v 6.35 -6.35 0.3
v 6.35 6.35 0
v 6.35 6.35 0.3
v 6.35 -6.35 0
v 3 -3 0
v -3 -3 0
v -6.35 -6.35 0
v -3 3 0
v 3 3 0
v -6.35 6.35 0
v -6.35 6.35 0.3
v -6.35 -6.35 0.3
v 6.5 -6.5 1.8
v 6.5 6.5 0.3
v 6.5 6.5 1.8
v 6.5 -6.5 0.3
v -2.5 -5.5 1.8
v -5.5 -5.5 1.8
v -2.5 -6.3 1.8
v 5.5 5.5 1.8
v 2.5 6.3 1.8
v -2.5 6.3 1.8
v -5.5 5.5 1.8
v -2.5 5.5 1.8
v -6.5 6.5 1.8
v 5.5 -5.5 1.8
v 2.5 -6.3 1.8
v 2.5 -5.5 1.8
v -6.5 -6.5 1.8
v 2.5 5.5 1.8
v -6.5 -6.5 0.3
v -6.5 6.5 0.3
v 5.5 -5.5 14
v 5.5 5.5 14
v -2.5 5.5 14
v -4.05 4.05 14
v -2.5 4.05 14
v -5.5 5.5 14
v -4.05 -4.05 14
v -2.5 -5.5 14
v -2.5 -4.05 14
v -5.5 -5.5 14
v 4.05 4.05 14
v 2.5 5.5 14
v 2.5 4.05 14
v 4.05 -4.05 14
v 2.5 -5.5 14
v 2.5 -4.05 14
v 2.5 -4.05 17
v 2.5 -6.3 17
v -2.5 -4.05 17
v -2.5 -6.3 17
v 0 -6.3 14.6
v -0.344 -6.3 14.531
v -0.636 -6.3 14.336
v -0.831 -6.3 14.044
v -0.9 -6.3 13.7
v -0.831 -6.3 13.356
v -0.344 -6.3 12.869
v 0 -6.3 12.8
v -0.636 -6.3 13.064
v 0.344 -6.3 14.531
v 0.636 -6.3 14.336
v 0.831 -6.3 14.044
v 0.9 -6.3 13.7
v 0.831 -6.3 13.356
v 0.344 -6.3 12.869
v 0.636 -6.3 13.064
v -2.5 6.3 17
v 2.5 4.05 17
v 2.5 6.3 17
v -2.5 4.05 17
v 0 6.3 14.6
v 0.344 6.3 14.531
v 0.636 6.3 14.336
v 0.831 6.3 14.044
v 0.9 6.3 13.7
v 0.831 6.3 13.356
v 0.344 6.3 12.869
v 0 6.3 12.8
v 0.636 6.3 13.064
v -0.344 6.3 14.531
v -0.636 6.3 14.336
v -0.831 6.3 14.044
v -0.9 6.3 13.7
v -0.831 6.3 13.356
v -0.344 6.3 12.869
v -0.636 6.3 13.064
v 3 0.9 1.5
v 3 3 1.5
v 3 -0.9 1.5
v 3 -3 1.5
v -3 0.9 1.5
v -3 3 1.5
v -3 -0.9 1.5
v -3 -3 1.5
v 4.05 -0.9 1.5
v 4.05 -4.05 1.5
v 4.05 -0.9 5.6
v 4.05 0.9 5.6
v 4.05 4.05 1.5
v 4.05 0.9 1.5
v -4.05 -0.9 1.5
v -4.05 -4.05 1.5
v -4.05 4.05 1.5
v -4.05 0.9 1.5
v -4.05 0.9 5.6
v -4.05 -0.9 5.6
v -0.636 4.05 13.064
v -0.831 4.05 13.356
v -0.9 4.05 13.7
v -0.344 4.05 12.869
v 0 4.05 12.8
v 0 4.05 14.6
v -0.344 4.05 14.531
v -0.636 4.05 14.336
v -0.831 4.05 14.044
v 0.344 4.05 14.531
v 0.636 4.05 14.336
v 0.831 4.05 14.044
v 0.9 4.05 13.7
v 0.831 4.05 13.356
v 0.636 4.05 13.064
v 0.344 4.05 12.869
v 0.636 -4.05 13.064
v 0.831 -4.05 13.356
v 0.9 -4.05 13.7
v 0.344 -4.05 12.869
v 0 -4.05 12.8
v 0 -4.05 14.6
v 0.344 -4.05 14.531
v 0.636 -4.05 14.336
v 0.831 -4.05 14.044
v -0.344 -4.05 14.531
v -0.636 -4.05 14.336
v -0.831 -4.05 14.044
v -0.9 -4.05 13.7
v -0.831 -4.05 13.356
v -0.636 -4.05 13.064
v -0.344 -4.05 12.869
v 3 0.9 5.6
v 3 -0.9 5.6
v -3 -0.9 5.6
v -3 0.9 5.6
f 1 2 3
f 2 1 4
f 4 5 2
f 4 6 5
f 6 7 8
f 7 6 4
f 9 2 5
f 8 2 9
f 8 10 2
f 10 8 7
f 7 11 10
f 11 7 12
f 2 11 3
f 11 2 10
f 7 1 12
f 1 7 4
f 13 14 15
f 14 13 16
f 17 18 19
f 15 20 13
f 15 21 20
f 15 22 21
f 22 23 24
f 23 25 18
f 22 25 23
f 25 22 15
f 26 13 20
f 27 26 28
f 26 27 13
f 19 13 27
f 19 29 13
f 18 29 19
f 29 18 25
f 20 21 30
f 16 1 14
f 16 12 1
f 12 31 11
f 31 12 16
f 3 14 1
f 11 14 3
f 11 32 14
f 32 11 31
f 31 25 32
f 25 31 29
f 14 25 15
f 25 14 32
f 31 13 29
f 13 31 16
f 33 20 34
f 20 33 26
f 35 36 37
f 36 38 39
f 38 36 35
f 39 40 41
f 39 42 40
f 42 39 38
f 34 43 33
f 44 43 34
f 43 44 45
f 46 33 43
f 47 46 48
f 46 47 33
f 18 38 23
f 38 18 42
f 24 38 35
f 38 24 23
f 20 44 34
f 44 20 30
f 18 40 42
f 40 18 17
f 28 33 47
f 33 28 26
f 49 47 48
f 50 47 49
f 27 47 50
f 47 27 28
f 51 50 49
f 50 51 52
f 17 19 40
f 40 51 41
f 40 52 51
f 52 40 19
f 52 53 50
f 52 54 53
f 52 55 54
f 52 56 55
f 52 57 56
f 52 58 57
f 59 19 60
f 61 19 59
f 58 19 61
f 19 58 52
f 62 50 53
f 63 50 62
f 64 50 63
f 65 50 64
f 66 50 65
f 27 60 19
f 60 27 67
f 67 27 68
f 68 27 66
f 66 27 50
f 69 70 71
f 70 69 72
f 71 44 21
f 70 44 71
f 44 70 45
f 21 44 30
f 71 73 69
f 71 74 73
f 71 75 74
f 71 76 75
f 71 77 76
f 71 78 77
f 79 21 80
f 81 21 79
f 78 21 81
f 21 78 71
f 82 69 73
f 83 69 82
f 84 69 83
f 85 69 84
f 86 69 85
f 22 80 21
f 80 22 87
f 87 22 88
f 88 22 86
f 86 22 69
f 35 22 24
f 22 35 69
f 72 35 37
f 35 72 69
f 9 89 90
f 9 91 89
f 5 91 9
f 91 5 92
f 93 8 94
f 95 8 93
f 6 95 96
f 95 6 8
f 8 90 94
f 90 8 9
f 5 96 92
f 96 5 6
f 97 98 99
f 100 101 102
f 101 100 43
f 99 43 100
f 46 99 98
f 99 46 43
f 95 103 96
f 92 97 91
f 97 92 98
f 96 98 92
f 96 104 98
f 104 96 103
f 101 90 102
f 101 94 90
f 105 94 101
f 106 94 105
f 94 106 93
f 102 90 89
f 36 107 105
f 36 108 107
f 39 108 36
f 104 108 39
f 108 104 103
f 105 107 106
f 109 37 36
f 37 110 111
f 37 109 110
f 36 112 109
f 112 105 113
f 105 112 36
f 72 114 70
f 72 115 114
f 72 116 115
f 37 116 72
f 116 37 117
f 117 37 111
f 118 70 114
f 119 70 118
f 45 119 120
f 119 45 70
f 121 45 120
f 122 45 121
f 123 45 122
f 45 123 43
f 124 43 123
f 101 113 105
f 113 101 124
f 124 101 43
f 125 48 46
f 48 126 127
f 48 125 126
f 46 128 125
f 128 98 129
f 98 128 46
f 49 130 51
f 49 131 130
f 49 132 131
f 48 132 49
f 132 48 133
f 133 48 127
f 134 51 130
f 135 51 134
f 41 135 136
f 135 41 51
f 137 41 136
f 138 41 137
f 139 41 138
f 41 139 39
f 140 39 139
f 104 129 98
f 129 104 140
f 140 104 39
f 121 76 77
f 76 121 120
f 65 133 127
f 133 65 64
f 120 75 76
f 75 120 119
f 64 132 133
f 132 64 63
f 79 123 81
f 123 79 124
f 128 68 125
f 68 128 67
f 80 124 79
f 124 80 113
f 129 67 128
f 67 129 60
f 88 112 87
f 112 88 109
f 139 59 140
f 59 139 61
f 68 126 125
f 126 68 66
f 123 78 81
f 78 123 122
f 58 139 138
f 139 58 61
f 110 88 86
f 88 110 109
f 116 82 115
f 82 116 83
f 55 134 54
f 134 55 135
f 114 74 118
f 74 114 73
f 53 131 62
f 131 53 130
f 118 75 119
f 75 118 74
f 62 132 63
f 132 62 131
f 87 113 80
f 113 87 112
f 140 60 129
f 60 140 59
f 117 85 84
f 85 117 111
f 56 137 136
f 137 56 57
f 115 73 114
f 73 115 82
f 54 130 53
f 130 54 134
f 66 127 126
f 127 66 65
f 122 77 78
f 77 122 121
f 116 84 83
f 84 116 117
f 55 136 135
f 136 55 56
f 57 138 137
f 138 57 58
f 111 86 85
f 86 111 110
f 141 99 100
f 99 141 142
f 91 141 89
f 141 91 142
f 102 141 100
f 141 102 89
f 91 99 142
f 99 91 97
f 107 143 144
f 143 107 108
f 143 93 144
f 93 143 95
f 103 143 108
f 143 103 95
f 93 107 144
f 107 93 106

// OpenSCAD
//OpenSCAD-Skript

//Moduldefinition mit Parametern
module rahmen (
//Parameter
rimh=1.5,hght=6,leni=6,leno=13,swl=8.1,swh=4.1,balken=5
)
//Beginn Modul
{
difference(){   //difference 1
union(){        //union 1
difference(){   //difference 2
union(){        //union 2
    //alles, was vor der nächsten geschweiften Klammer steht, wird zusammengefügt (union 2)

//Rahmenkörper
translate([-leno/2+0.15,-leno/2+0.15,0]) cube([leno-0.3,leno-0.3,rimh]);
translate([-leno/2,-leno/2,0.3]) cube([leno,leno,rimh]);
//Hülse
translate([-leno/2+1,-leno/2+1,rimh+0.3]) cube([leno-2,leno-2,swh+swl]);
translate([-balken/2,-leno/2+0.2,rimh+0.3]) cube([balken,(leno-leni)/2-0.8,swh+swl+3]);
rotate([0,0,180]) translate([-balken/2,-leno/2+0.2,rimh+0.3]) cube([balken,(leno-leni)/2-0.8,swh+swl+3]);
}               //union 2 end
    //alles, was vor der nächsten geschweiften Klammer steht, wird davon abgezogen (difference 2)
//Ausschnitt
translate([-leni/2,-leni/2,-0.1]) cube([leni,leni,2*rimh]);
//Ausschnitt Hülse
translate([-leno/2+3,-leno/2+3,rimh+0.3]) cube([leno-6,leno-6,2*rimh]);
//Ausschnitt Schalter
translate([-swl/2,-swl/2,rimh]) cube([swl,swl,20]);
//Befestigung Schalter
rotate([90,0,0]) translate([0,swh+swl+rimh,-20]) cylinder(d=1.8, h=50,$fn=16);
}  //difference 2 end
    //alles, was vor der nächsten geschweiften Klammer steht, wird dazu hinzugefügt (union 1)
//Führung
translate([leni/2,-0.9,rimh]) cube([1.8,1.8,swh]);
rotate([0,0,180]) translate([leni/2,-0.9,rimh]) cube([1.8,1.8,swh]);

}               //union 1 end
    //alles, was vor der nächsten geschweiften Klammer steht, wird davon wieder abgezogen (difference 1)

}               //difference 1 end

}  //module end


//Hier werden Instanzen des Moduls aufgerufen
translate([0,0,0]) rahmen();
